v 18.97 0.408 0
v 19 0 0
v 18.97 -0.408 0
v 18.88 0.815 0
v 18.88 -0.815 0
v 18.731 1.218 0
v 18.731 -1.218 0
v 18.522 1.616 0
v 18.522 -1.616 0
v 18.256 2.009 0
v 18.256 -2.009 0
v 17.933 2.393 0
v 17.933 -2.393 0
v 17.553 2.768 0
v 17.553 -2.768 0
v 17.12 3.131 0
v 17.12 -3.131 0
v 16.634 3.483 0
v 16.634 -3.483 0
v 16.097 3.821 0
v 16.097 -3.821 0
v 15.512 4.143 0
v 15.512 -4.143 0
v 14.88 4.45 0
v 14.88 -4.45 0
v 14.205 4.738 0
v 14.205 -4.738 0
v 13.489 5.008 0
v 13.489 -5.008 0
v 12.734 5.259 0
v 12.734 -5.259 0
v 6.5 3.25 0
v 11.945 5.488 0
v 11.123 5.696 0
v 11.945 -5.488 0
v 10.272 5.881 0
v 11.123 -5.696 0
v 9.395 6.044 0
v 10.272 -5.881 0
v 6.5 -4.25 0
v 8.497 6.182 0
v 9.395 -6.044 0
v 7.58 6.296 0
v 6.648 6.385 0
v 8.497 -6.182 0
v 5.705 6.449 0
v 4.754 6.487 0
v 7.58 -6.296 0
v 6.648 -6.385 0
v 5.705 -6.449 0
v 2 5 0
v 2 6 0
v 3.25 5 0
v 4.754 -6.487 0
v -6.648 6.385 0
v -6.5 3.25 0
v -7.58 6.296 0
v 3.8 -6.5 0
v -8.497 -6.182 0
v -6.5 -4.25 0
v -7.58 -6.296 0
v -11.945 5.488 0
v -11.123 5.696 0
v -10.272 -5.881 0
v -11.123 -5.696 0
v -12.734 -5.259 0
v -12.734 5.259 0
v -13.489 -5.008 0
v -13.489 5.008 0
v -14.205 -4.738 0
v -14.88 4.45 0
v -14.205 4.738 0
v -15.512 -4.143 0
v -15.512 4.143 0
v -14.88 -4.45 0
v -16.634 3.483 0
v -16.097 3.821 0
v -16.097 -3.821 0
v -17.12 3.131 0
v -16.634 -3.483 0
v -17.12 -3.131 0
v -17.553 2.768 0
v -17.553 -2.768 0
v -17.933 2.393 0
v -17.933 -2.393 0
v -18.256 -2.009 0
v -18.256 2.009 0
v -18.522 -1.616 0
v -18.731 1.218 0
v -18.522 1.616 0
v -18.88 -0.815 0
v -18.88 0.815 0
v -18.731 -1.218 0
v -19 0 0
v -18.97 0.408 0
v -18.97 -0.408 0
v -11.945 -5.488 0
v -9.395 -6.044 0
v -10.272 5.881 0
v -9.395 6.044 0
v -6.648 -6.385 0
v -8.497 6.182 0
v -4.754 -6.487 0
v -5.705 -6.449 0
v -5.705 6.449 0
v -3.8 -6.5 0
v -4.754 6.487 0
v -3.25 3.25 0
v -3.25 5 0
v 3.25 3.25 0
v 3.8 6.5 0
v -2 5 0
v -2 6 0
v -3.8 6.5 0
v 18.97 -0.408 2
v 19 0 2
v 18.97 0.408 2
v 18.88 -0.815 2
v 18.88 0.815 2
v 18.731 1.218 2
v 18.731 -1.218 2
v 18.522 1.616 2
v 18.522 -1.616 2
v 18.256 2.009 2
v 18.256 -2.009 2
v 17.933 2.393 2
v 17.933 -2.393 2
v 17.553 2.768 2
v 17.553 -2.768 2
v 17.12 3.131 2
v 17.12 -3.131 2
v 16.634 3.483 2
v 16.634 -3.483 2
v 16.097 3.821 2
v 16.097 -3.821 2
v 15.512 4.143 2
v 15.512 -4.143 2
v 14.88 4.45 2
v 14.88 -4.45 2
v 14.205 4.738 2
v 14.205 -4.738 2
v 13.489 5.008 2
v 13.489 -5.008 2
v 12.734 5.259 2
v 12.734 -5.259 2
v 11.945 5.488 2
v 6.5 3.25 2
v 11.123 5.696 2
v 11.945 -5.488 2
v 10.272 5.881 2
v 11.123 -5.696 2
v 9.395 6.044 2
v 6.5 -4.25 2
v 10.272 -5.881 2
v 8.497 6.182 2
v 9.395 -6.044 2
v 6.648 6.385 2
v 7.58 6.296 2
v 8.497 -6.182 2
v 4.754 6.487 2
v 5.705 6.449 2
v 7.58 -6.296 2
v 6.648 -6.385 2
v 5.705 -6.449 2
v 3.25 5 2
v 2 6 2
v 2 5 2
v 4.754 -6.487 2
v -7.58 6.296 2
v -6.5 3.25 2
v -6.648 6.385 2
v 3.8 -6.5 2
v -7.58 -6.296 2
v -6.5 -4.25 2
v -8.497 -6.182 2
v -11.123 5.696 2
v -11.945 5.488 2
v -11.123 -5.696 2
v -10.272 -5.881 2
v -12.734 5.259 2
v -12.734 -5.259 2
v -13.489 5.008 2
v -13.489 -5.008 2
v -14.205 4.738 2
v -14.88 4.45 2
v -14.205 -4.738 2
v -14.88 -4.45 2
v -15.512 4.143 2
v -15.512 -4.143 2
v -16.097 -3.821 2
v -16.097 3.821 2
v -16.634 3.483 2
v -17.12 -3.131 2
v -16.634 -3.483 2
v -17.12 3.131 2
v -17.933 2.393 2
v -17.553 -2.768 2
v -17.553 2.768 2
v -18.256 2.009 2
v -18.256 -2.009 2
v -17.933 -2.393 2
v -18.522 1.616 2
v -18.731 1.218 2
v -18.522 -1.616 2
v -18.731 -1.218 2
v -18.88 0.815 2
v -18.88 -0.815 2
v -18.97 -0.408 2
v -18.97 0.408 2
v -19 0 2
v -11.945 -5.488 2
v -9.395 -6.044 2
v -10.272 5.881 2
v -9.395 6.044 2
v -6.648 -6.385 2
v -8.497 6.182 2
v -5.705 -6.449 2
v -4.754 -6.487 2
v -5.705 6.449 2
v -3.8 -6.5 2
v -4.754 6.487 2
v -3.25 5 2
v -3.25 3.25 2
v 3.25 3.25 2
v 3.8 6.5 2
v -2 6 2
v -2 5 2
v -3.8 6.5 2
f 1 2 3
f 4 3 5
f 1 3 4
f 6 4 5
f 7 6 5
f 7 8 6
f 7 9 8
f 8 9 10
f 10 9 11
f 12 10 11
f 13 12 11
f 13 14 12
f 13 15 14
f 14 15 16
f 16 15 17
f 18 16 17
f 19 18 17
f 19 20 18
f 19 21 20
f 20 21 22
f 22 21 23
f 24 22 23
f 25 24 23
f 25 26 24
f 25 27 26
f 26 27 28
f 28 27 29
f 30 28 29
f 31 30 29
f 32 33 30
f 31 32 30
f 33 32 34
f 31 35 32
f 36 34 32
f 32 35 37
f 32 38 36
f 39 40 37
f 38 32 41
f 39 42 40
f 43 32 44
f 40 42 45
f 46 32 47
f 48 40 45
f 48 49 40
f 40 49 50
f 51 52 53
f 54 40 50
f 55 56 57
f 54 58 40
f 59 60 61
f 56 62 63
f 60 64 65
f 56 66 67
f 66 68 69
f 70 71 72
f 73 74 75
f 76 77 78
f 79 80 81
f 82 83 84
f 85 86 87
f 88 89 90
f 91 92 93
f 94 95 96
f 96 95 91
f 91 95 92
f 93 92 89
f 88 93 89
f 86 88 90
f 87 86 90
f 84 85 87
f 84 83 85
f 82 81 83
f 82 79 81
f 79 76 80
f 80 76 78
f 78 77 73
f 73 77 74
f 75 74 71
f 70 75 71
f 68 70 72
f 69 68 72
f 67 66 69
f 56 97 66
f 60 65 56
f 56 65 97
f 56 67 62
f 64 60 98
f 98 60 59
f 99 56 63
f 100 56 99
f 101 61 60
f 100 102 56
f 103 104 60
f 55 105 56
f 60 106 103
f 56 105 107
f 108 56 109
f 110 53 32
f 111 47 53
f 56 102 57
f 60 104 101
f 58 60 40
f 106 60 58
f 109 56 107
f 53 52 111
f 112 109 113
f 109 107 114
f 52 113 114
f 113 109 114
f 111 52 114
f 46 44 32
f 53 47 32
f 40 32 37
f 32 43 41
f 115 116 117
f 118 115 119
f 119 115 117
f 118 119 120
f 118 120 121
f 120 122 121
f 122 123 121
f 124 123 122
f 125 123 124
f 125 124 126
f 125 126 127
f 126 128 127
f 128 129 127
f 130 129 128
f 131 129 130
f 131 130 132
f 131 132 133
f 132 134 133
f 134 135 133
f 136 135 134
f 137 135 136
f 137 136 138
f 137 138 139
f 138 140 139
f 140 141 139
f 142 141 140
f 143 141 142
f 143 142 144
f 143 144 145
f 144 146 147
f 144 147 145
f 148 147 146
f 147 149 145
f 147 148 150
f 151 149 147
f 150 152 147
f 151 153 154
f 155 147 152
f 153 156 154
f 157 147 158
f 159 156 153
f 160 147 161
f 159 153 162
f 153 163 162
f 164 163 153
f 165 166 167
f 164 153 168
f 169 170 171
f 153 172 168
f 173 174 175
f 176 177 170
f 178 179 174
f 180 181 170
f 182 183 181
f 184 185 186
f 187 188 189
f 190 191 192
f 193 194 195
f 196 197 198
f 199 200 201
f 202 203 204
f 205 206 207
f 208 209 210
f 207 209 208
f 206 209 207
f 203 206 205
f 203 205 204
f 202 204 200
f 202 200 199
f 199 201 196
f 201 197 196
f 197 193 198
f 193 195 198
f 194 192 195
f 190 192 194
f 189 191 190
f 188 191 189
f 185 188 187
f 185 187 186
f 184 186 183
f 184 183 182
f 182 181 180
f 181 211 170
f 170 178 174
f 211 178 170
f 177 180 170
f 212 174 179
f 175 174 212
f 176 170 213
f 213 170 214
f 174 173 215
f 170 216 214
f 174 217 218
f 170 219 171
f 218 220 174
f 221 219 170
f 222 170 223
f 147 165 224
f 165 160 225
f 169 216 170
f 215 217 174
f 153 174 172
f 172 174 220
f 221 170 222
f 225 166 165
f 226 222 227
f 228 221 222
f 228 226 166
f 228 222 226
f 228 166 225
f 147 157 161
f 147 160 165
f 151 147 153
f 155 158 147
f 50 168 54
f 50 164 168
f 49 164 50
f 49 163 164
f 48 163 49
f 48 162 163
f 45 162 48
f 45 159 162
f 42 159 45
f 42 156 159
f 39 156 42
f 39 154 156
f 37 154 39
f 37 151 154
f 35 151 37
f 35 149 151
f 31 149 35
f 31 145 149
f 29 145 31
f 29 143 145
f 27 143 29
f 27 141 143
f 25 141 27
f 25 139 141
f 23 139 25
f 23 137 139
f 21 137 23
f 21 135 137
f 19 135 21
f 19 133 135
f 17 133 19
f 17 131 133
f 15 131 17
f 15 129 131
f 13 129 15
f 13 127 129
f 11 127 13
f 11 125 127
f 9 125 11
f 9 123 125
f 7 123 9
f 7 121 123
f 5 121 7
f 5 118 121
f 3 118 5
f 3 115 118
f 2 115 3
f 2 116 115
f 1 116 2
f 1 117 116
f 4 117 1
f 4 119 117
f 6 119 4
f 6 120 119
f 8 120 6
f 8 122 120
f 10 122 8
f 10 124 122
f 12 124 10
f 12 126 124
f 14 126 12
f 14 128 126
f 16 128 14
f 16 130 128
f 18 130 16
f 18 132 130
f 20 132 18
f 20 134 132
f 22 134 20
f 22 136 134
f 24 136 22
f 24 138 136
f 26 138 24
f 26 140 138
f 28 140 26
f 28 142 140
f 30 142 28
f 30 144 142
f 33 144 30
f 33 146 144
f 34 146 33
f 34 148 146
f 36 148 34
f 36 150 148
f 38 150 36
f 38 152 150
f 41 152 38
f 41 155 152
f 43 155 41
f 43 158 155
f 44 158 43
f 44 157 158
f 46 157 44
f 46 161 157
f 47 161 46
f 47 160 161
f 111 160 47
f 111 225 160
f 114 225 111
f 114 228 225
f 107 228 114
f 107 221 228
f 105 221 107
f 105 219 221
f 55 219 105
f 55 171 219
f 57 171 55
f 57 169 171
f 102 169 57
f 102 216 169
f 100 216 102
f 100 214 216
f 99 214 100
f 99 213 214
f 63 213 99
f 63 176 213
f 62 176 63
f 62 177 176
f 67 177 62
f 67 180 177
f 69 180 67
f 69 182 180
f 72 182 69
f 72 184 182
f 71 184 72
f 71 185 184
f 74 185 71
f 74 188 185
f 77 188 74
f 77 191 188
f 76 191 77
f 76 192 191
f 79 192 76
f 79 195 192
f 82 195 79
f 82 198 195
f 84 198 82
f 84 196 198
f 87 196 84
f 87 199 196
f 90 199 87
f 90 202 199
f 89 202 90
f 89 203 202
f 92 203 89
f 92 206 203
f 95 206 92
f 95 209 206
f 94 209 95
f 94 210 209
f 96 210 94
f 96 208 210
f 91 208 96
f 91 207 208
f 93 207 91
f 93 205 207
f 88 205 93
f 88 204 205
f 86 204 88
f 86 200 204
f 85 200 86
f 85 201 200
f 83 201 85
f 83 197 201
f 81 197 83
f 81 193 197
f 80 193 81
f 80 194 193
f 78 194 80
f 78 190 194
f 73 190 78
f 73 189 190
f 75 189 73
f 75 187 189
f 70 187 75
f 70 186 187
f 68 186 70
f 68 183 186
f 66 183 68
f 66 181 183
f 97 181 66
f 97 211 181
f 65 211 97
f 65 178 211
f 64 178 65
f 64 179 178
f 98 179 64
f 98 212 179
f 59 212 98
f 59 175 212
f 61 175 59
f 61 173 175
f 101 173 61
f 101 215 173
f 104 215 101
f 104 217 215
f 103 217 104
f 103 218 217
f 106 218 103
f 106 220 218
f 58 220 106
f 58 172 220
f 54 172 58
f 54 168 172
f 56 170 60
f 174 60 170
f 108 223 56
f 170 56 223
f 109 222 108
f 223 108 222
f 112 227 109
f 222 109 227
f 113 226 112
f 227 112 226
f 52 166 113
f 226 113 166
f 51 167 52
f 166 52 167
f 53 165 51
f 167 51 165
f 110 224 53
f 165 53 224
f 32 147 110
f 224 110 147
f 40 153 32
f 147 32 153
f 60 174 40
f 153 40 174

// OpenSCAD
$fn = 100;
linear_extrude(height = 2) {
    difference() {
        w = 38;
        h = 13;
        hull() {
            s = 1.25;
            scale([w / h, 1]) circle(r = h / 2);
            translate([(w - w / s) / 2, 0]) scale([w / h / s, 1]) circle(r = h / 2);
            translate([-(w - w / s) / 2, 0]) scale([w / h / s, 1]) circle(r = h / 2);
        }
        union() {
            sw = 13;            
            t = 3;
            b = 2.5;
            nw1 = 4;
            nm1 = 0.5;
            nw2 = 6.5;
            nm2 = 1.5;
            translate([0, b - t]) square([sw, h - t - b], center = true);
            translate([-nw1 / 2, 0]) square([nw1, h / 2 - nm1]);
            translate([-nw2 / 2, 0]) square([nw2, h / 2 - nm2]);
        }
    }
}
